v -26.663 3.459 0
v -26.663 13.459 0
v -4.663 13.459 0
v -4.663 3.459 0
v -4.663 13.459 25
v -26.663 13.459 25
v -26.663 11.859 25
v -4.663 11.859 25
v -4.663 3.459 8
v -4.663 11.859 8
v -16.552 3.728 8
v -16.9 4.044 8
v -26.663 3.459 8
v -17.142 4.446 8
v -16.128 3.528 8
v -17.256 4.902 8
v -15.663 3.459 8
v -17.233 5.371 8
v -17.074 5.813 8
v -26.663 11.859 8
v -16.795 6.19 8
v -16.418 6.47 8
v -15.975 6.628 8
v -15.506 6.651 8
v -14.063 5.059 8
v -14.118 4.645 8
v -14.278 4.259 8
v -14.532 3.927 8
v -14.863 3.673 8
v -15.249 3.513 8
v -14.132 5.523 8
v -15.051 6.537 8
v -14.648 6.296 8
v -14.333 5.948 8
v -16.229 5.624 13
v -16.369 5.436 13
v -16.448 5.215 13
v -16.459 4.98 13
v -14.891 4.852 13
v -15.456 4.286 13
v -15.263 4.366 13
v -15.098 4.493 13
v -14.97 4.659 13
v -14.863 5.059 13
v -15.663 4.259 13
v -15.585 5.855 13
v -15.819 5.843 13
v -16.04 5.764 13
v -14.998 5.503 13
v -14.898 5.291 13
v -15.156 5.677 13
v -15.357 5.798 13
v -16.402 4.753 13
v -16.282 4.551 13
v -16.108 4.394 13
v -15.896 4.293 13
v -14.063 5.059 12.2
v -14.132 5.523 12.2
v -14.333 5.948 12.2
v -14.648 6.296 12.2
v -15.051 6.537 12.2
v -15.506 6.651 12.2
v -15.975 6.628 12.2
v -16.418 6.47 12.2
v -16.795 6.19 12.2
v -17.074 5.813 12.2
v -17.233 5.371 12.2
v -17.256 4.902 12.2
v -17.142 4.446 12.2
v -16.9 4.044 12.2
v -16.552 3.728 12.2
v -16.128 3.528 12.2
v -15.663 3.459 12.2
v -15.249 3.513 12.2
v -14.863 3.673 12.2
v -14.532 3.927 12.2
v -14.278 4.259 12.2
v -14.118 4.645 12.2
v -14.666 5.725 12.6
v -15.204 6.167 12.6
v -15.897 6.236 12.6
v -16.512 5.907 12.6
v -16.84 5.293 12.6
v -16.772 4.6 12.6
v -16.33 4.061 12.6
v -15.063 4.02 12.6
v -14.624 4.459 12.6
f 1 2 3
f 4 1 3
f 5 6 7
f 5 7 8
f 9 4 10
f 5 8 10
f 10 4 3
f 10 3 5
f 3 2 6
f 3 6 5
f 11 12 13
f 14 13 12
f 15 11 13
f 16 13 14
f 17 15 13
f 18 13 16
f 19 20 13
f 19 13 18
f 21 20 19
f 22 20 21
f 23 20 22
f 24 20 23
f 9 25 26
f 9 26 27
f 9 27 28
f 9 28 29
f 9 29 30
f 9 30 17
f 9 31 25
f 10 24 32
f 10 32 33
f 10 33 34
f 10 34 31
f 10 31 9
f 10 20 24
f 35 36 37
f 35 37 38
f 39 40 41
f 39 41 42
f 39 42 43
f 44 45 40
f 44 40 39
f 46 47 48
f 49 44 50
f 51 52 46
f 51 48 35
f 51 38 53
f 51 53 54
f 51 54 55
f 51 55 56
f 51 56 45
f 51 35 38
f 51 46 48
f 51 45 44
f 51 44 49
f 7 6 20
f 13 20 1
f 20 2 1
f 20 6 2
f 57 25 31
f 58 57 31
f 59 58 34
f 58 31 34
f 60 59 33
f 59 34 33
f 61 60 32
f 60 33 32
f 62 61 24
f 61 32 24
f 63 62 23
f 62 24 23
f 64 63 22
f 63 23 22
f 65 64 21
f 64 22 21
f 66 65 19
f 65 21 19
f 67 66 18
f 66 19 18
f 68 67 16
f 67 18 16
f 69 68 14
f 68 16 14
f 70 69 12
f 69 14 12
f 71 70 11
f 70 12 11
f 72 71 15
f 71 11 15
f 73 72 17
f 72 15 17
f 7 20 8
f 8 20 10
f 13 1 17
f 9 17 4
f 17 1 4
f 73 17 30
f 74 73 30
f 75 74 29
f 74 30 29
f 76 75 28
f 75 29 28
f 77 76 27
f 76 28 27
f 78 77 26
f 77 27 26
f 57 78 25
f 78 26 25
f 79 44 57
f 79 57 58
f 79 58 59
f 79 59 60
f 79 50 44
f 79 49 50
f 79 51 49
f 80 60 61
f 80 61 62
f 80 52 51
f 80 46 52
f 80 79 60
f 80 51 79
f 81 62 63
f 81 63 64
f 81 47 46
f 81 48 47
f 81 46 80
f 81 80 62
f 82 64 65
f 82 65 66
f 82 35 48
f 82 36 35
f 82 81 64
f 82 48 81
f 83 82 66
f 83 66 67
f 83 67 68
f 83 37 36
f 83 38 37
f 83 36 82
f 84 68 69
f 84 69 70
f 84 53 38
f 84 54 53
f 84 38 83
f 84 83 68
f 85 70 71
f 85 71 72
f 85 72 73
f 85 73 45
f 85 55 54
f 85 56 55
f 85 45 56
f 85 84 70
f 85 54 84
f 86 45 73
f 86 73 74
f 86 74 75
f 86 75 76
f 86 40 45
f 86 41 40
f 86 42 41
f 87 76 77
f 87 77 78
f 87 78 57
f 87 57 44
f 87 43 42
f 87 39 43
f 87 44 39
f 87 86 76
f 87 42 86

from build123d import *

# Parameters (mm, degrees)
F0_W     = 22
F0_H     = 1.6
F1_DEPTH = 8
F2_DEPTH = 25
F3_DEPTH = 13
F4_SIZE  = 0.8


with BuildPart() as f1:
    # F0 (on Top) → F1 (new body)
    with BuildSketch(Plane.XY):
        Polygon((-15.6633, 3.458741), (-4.6633, 3.458741), (-4.6633, 11.858741), (-26.6633, 11.858741), (-26.6633, 3.458741), align=None)
        with BuildLine():
            ThreePointArc((-14.0633, 5.058741), (-14.531929, 3.92737), (-15.6633, 3.458741))
            ThreePointArc((-15.6633, 3.458741), (-16.794671, 6.190112), (-14.0633, 5.058741))
        make_face(mode=Mode.SUBTRACT)
        with Locations((-15.6633, 12.658741)):
            Rectangle(F0_W, F0_H)
        with BuildLine():
            ThreePointArc((-14.0633, 5.058741), (-16.794671, 6.190112), (-15.6633, 3.458741))
            ThreePointArc((-15.6633, 3.458741), (-14.531929, 3.92737), (-14.0633, 5.058741))
        make_face()
    extrude(amount=F1_DEPTH)

    # F0 (on Top) → F2 (join)
    with BuildSketch(Plane.XY):
        with Locations((-15.6633, 12.658741)):
            Rectangle(F0_W, F0_H)
    extrude(amount=F2_DEPTH)

    # F0 (on Top) → F3 (join)
    with BuildSketch(Plane.XY):
        with BuildLine():
            ThreePointArc((-14.0633, 5.058741), (-16.794671, 6.190112), (-15.6633, 3.458741))
            ThreePointArc((-15.6633, 3.458741), (-14.531929, 3.92737), (-14.0633, 5.058741))
        make_face()
    extrude(amount=F3_DEPTH)

    # F4
    f4_edges = [f1.edges().sort_by_distance(p)[0] for p in [
        (-15.6633, 6.658741, 13),
    ]]
    chamfer(f4_edges, length=F4_SIZE)


solid = f1.part
